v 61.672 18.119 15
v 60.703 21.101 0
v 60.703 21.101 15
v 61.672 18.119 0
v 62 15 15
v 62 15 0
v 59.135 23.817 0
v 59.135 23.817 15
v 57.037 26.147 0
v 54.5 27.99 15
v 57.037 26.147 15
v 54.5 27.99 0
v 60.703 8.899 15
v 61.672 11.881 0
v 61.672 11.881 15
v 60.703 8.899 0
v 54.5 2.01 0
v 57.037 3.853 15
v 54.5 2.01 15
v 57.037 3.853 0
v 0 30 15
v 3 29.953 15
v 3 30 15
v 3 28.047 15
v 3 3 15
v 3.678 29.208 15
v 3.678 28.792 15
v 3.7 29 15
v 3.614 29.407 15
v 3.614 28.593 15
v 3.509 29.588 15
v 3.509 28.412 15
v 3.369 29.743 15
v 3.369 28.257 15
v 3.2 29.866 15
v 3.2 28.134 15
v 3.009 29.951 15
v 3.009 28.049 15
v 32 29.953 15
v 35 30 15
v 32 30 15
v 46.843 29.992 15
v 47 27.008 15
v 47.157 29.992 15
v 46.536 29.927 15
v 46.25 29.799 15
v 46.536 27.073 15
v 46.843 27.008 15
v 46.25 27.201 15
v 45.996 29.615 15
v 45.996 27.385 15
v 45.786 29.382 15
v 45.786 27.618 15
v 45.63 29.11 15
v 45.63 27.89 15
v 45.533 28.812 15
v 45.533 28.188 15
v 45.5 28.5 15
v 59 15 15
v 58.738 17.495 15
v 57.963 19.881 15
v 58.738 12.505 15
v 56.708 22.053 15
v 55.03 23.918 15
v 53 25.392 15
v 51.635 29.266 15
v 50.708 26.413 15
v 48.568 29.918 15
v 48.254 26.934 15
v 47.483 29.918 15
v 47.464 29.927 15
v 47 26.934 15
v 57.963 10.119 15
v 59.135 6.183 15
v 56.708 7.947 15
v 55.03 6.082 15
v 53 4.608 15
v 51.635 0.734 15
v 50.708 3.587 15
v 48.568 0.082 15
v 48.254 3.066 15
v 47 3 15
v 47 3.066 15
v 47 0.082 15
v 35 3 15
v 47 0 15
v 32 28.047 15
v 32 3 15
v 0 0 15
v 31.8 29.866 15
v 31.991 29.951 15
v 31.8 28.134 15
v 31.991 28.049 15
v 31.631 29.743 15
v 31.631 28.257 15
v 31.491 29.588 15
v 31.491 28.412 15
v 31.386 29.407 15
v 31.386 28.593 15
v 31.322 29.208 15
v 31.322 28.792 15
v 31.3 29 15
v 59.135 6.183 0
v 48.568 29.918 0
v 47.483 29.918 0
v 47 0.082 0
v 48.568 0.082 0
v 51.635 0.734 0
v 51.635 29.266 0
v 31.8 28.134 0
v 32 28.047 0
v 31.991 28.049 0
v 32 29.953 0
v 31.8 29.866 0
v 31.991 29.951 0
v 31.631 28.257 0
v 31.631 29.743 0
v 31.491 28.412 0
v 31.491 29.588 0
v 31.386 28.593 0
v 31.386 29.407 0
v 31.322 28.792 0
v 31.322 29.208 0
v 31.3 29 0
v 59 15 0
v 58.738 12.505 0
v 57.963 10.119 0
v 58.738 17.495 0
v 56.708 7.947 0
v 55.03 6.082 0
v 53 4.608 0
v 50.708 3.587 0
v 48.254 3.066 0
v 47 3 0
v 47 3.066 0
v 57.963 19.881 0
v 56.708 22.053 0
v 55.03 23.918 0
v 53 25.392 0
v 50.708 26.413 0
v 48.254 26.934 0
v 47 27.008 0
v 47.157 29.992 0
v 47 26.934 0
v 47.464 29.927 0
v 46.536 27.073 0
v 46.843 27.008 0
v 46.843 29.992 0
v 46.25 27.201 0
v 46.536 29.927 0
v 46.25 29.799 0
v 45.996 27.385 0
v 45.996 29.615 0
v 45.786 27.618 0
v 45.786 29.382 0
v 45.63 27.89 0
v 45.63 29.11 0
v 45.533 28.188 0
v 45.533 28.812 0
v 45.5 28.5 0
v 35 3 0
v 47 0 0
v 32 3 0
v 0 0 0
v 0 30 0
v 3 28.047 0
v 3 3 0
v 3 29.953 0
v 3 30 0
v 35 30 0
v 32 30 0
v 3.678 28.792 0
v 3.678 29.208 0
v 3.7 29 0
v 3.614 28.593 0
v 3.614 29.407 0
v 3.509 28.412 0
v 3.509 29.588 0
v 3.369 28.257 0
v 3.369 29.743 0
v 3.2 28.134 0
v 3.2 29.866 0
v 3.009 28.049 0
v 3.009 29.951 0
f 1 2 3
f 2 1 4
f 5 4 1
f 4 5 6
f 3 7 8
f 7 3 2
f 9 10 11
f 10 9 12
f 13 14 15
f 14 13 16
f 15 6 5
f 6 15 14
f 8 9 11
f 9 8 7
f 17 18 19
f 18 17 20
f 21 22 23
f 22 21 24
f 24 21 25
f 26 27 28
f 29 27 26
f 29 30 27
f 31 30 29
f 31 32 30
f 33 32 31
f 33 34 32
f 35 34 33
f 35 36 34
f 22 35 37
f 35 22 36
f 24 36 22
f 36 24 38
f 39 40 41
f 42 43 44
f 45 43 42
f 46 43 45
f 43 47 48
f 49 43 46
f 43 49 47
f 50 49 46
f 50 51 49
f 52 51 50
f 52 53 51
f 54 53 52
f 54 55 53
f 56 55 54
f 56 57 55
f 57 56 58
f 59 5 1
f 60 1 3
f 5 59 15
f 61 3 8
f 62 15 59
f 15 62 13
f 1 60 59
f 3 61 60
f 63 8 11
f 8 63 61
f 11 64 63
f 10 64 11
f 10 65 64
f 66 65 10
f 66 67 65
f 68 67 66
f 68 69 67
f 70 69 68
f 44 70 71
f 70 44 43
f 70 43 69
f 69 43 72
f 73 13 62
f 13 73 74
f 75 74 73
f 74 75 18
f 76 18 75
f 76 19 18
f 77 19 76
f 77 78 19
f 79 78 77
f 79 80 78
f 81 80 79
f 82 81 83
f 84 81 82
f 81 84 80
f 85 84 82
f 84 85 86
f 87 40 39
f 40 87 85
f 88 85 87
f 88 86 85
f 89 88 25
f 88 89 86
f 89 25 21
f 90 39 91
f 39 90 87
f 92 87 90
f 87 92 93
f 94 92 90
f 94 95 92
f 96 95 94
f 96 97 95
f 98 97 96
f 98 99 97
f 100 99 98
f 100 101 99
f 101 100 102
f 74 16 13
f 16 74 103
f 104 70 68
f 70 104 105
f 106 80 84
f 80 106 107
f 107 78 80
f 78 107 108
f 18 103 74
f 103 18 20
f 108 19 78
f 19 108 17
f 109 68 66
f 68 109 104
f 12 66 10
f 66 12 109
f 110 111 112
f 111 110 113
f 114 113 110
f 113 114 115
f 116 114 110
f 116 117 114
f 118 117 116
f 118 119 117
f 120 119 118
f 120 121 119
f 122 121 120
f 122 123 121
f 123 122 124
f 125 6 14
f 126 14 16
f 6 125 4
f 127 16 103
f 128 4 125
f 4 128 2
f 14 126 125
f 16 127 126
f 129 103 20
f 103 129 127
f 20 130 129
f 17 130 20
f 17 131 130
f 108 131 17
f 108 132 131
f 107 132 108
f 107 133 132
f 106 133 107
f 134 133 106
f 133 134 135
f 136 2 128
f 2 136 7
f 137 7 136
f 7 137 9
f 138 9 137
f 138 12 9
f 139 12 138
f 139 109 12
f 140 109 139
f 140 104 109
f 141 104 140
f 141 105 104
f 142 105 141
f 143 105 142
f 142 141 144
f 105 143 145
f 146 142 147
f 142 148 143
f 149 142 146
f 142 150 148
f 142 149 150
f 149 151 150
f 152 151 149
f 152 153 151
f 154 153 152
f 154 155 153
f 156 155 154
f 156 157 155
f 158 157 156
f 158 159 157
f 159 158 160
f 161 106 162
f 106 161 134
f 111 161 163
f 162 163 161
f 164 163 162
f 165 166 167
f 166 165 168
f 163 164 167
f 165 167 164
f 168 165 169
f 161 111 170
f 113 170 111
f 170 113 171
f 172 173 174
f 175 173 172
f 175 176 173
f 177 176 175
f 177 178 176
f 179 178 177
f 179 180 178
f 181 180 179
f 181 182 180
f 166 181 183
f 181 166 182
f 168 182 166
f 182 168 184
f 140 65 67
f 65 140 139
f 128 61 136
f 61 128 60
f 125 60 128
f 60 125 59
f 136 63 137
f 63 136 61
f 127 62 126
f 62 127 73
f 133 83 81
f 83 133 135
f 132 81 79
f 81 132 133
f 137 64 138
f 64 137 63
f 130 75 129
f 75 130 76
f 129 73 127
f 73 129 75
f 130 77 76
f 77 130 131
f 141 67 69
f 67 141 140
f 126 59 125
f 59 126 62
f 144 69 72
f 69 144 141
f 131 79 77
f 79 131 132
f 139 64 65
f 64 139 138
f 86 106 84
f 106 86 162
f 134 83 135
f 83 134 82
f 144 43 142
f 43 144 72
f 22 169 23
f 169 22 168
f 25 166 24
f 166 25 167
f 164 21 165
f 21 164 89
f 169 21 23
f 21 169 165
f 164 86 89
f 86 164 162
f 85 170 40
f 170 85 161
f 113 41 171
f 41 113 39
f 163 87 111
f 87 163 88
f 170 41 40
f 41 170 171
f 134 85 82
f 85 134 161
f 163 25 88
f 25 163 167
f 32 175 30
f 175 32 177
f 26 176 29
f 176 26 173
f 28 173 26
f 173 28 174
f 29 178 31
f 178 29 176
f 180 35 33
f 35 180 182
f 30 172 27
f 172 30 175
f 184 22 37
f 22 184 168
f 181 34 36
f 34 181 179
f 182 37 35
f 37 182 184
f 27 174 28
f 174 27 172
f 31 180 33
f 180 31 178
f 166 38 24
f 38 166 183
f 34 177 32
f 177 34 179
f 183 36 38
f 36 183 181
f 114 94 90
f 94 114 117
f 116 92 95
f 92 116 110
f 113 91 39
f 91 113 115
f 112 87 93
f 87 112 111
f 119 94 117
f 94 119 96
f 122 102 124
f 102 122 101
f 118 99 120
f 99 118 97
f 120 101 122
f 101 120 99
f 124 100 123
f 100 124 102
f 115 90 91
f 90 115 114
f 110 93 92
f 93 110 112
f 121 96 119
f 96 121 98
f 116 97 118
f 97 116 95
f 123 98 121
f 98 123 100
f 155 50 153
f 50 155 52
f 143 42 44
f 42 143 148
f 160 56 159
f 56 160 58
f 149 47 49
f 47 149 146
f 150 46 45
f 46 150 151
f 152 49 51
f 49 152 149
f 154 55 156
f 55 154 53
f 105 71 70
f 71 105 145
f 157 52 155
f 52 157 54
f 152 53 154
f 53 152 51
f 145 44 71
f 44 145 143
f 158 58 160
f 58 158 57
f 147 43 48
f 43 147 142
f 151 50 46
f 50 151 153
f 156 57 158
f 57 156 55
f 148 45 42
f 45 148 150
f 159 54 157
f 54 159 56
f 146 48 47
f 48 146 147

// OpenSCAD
//CUSTOMIZER VARIABLES
/* [Basic] */
//Table thickness
Table_Thickness=28;//[10:100]
//Length
Length=30;//[20:50]
//Clip thickness
Clip_Thickness=3;//[3:6]
//Clip width
Clip_Width=15;//[10:30]
//Max cable diameter
Cable_Diameter=10;//[3:20]
//CUSTOMIZER VARIABLES END

$fs=0.2;
cube ([Clip_Thickness,Length,Clip_Width]);
translate ([Table_Thickness+Clip_Thickness+1,0,0]) cube ([Clip_Thickness,Length,Clip_Width]);
cube ([Table_Thickness+Clip_Thickness*3+Cable_Diameter,Clip_Thickness,Clip_Width]);
translate ([Clip_Thickness-0.3,Length-1,0]) cylinder(h=Clip_Width,r=1);
translate ([Table_Thickness+Clip_Thickness+1.3,Length-1,0]) cylinder(h=Clip_Width,r=1);
translate ([Table_Thickness+Clip_Thickness*3+Cable_Diameter,Length-Clip_Thickness/2,0]) cylinder(h=Clip_Width,r=Clip_Thickness/2);
translate ([Table_Thickness+Clip_Thickness*3+Cable_Diameter,Length/2,0]) difference () {
	cylinder(h=Clip_Width,r=Length/2);
	translate ([0,0,-0.5])cylinder(h=Clip_Width+1,r=Length/2-Clip_Thickness);
	translate ([-Length/2,-Length/2,-0.5]) cube([Length/2,Length,Clip_Width+1]);
}
